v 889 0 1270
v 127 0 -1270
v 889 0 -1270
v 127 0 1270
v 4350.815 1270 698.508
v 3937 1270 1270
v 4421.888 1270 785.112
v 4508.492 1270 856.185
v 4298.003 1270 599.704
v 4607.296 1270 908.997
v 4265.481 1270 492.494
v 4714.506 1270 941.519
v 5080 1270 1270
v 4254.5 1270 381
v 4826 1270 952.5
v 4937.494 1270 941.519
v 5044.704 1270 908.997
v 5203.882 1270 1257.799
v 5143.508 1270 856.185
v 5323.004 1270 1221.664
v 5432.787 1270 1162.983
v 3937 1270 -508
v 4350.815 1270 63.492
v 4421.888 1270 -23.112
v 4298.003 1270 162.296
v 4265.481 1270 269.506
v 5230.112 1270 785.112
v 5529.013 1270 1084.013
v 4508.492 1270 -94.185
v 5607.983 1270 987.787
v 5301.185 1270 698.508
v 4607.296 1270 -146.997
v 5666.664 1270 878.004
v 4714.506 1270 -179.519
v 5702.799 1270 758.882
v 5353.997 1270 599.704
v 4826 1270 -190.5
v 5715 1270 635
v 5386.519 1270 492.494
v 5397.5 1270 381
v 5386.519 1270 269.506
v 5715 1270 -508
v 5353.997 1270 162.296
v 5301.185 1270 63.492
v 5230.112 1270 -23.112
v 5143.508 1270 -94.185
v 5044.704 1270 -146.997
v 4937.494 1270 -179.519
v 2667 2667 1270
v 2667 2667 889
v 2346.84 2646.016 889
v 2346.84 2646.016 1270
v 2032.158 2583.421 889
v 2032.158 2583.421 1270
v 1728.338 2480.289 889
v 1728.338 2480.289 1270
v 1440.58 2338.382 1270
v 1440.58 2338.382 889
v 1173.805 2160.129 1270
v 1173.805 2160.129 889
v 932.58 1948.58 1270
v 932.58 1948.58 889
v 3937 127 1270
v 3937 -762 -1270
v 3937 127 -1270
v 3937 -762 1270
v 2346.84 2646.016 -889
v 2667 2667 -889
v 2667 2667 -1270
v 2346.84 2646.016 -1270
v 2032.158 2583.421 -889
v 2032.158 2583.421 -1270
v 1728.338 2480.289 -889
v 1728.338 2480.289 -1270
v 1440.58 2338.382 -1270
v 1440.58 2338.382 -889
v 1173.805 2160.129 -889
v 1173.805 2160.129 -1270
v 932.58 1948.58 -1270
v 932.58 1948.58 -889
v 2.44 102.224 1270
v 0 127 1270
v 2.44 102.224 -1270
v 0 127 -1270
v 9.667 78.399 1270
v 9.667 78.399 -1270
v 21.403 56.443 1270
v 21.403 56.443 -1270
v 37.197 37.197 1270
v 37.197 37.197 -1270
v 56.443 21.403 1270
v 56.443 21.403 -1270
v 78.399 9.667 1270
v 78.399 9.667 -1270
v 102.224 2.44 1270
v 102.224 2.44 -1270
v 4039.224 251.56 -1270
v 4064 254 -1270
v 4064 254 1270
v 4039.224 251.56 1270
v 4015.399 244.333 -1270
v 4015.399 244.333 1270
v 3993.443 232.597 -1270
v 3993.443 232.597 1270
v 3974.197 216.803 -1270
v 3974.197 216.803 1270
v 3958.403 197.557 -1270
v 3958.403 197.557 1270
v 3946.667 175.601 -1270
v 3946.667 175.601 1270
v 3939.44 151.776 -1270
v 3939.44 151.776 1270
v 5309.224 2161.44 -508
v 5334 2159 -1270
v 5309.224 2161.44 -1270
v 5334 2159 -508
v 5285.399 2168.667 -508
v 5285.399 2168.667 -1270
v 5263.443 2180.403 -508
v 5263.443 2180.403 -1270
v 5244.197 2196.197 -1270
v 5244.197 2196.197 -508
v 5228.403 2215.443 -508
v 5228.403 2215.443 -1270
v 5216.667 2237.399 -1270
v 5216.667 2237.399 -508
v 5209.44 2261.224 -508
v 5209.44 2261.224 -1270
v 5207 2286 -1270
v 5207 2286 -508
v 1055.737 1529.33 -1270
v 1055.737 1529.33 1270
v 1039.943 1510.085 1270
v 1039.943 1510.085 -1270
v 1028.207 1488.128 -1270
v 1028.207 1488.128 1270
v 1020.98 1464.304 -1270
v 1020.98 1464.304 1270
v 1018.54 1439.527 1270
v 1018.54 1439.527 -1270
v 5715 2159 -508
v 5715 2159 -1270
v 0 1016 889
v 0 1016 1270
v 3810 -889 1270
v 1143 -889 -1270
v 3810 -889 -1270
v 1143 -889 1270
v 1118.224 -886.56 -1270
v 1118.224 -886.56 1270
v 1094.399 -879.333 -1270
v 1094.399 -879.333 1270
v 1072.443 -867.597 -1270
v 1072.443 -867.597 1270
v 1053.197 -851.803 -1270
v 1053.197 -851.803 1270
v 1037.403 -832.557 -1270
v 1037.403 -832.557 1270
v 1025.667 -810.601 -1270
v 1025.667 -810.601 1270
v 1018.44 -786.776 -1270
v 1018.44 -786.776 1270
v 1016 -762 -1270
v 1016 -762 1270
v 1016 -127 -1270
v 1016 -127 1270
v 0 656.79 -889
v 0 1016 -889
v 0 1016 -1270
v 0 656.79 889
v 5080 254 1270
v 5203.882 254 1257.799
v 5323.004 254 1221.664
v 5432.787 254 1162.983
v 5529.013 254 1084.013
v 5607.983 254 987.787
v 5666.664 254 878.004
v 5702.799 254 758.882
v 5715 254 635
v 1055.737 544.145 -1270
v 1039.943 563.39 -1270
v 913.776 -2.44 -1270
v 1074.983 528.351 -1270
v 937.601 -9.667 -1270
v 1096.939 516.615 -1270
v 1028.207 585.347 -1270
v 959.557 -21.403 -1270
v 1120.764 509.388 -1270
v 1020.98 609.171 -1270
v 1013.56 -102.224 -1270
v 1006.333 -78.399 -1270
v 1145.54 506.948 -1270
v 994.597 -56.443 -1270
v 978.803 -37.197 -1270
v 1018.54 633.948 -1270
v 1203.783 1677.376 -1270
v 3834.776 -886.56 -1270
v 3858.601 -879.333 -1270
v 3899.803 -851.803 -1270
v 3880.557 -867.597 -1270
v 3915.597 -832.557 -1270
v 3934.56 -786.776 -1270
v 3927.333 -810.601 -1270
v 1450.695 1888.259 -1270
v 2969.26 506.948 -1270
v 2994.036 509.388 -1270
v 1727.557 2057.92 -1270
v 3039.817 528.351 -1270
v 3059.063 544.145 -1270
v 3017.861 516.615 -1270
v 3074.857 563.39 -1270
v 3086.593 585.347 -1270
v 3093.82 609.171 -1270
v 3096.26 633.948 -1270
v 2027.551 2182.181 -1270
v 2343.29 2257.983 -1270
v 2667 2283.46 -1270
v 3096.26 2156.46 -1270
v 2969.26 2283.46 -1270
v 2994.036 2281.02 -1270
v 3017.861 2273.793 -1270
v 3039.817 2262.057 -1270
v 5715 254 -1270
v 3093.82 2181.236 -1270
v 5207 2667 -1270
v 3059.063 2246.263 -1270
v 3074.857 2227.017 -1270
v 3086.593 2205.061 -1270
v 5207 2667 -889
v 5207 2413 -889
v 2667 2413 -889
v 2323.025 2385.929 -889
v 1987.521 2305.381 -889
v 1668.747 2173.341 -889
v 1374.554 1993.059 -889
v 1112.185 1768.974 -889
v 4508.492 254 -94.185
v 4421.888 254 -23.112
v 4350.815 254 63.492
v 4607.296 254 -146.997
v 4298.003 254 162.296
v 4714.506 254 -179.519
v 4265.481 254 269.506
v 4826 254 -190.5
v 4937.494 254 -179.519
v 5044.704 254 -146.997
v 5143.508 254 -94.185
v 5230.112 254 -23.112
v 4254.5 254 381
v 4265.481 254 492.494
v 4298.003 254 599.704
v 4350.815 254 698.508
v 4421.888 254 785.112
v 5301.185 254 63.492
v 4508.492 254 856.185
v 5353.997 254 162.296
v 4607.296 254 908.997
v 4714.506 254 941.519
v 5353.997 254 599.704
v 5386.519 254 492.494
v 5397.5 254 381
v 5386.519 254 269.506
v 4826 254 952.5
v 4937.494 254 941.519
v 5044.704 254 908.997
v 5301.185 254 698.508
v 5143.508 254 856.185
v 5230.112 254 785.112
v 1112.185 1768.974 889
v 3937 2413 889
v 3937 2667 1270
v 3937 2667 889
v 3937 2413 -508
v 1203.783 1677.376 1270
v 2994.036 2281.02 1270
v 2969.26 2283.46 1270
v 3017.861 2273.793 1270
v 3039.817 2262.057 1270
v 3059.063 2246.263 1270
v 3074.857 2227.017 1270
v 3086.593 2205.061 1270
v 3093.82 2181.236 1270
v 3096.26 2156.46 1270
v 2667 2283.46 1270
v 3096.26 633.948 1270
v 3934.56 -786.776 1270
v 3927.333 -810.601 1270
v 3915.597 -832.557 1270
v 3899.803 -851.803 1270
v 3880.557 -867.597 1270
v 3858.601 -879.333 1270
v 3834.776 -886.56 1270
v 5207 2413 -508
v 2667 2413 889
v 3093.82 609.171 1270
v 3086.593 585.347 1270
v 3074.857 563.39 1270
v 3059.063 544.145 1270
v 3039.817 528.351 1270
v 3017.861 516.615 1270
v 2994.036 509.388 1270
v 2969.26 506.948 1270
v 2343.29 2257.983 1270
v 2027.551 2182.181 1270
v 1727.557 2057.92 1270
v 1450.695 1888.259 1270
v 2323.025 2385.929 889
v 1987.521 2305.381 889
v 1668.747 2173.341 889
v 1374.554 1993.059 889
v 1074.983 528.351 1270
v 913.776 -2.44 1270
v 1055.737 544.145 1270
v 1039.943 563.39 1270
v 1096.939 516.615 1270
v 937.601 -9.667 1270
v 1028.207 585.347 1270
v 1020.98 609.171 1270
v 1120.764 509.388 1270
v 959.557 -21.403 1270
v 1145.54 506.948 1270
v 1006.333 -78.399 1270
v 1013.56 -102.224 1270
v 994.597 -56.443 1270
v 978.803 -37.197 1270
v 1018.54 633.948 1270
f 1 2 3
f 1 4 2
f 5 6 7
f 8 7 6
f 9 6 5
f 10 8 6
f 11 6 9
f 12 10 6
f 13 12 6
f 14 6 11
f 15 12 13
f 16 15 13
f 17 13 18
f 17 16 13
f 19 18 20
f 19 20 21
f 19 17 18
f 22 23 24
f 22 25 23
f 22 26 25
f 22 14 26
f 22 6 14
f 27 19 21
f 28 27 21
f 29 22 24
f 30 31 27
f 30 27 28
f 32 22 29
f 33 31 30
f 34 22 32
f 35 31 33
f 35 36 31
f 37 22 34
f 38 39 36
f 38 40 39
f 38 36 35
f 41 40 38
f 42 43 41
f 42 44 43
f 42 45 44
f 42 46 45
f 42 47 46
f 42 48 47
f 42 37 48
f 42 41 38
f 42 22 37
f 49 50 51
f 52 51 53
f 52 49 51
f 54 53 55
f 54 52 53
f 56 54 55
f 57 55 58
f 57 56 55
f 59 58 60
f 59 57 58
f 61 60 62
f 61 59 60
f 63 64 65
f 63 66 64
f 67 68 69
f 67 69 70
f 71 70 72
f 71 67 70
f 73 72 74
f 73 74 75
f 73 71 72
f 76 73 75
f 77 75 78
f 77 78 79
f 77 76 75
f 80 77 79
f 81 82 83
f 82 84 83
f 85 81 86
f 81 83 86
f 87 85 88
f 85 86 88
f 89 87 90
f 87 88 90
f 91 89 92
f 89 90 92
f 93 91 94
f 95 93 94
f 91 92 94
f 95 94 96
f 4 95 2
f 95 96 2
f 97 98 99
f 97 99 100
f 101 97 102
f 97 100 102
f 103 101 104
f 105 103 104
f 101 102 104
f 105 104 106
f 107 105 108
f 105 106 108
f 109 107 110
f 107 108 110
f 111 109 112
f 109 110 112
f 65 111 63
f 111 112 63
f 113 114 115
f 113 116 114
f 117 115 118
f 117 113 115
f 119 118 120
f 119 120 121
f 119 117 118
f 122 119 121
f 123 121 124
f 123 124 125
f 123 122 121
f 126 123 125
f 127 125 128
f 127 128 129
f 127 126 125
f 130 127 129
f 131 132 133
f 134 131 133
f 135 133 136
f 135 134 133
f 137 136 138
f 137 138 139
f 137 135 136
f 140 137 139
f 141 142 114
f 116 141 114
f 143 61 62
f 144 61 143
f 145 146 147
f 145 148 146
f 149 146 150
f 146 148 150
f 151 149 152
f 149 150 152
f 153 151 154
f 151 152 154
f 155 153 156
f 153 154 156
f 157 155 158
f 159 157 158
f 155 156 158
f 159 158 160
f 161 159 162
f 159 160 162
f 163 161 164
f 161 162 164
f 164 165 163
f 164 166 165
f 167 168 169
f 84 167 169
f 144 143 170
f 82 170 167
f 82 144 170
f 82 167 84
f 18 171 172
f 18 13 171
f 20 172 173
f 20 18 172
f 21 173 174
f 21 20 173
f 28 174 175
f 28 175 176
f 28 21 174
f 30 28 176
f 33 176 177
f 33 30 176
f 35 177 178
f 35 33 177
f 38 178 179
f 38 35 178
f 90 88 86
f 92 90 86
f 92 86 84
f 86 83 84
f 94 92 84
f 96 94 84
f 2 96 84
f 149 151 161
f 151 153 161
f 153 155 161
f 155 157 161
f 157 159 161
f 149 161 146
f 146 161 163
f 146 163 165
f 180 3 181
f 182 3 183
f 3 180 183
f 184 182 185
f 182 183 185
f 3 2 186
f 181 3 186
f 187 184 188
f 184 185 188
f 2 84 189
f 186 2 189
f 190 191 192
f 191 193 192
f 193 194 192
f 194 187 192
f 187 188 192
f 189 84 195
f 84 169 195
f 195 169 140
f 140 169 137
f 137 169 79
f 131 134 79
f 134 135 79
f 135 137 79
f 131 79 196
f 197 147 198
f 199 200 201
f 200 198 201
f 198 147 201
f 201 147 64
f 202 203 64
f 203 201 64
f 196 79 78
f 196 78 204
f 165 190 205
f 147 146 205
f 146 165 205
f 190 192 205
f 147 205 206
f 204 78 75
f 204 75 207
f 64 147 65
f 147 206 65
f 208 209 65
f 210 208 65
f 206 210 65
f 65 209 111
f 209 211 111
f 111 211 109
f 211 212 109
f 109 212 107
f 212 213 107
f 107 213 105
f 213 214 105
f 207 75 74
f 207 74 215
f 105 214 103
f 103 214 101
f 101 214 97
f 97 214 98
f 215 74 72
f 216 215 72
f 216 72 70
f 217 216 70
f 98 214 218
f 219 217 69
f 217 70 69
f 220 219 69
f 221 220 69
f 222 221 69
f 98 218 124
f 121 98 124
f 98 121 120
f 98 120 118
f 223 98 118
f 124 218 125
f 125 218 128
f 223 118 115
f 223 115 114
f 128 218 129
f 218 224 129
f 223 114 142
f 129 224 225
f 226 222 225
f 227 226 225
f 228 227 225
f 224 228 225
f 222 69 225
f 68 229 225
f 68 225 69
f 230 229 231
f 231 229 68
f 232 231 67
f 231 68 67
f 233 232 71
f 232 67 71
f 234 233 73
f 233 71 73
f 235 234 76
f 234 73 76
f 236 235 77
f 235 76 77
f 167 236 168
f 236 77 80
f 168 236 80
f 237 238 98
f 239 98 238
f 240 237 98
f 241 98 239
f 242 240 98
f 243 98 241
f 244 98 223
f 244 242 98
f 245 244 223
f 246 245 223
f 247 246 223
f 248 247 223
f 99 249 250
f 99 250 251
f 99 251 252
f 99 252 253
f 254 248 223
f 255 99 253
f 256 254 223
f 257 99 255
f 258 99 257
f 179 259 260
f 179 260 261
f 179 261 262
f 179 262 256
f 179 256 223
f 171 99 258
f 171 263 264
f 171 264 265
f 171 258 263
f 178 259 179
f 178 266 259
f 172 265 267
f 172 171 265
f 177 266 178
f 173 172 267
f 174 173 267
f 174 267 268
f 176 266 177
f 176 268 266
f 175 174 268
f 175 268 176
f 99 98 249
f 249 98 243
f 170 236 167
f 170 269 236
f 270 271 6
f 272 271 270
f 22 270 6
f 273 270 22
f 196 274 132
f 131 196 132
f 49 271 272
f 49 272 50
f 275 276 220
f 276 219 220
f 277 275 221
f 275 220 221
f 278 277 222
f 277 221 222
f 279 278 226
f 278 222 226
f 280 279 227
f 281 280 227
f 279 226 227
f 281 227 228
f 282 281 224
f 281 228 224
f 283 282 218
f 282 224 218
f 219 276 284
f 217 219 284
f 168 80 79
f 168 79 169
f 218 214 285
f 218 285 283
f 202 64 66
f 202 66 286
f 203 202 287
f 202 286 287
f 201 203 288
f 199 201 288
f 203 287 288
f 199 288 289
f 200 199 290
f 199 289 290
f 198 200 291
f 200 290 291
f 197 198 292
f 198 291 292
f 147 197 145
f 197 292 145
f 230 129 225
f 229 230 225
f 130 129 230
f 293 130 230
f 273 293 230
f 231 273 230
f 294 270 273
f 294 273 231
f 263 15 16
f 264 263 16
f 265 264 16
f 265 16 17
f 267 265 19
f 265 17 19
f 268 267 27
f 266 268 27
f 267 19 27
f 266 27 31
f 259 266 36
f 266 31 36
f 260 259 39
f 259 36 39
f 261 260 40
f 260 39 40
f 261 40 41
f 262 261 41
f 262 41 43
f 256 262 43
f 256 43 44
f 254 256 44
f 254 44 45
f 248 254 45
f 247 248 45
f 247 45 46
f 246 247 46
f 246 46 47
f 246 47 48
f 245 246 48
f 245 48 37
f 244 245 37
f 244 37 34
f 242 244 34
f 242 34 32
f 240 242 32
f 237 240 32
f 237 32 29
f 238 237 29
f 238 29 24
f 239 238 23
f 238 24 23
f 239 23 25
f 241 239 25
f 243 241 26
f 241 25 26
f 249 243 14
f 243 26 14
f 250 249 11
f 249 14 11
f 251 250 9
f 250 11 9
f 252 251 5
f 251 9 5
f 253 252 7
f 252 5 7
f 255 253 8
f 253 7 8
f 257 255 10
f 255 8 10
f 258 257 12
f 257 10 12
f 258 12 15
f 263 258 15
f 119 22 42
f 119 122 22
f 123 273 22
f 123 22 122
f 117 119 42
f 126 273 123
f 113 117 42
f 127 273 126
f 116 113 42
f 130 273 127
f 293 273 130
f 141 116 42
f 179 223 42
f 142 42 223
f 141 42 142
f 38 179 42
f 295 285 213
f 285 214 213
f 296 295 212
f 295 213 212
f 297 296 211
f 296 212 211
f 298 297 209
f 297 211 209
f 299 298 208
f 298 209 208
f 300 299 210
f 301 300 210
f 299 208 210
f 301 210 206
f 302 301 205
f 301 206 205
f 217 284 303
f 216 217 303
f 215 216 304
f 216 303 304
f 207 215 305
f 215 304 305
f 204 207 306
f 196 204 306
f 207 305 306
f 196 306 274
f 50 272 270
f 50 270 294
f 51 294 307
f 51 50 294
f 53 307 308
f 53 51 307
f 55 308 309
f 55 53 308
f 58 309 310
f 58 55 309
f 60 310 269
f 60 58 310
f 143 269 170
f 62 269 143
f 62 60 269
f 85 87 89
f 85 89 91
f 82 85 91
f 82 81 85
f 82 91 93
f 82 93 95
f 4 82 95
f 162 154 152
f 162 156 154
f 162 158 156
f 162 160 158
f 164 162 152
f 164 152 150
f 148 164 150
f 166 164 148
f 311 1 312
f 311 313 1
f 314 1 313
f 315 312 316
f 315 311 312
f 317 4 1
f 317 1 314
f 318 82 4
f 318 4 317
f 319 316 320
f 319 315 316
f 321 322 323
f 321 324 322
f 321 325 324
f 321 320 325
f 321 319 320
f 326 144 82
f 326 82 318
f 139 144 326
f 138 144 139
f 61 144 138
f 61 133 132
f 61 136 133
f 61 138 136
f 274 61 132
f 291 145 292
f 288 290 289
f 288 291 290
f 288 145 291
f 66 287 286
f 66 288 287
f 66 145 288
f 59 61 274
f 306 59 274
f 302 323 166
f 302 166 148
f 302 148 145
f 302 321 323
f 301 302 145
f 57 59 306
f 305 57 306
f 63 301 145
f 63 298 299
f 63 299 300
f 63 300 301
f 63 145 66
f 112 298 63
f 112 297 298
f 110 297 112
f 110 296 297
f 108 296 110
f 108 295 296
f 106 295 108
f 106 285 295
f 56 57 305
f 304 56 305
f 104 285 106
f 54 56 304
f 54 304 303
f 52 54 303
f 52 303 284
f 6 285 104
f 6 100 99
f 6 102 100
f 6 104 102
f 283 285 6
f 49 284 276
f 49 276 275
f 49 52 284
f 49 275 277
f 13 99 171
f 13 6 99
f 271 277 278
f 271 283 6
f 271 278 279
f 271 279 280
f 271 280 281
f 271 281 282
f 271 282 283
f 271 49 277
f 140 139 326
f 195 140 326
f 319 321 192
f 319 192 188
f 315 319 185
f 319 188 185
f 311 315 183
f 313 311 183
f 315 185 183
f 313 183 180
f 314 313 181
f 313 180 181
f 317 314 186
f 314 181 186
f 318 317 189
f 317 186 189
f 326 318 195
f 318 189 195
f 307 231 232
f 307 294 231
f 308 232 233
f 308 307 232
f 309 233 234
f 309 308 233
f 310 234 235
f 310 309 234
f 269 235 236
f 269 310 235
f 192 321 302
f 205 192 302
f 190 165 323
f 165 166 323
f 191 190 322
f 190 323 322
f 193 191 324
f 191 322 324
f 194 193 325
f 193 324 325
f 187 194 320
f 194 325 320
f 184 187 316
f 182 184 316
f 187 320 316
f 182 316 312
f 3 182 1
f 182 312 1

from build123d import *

# Parameters (mm, degrees)
BOSS_EXTRUDE1_DEPTH = 1270
CUT_EXTRUDE2_DEPTH  = 6799.949477677
CUT_EXTRUDE3_DEPTH  = 889
SKETCH5_W           = 1778
SKETCH5_H           = 1778
CUT_EXTRUDE4_DEPTH  = 1397
SKETCH6_R           = 571.5
CUT_EXTRUDE5_DEPTH  = 6240.824196241
FILLET1_R           = 635
FILLET2_R           = 127
FILLET3_R           = 127


with BuildPart() as part:
    # Sketch1 → Boss-Extrude1 (new, symmetric)
    with BuildSketch(Plane.XY):
        with BuildLine():
            Line((0, 0), (1016, 0))
            Line((1016, 0), (1016, -889))
            Line((1016, -889), (3937, -889))
            Line((3937, -889), (3937, 254))
            Line((3937, 254), (5715, 254))
            Line((5715, 254), (5715, 2159))
            Line((5715, 2159), (5207, 2159))
            Line((5207, 2159), (5207, 2667))
            Line((5207, 2667), (2667, 2667))
            ThreePointArc((2667, 2667), (1728.338394969, 2480.288597975), (932.579510314, 1948.579510314))
            Line((932.579510314, 1948.579510314), (0, 1016))
            Line((0, 1016), (0, 0))
        make_face()
    extrude(amount=BOSS_EXTRUDE1_DEPTH, both=True)

    # Sketch3 → Cut-Extrude2 (cut, through all)
    with BuildSketch(Plane.XY.offset(1270)):
        with BuildLine():
            Line((3096.26, 2283.46), (2667, 2283.46))
            ThreePointArc((2667, 2283.46), (1875.112798618, 2125.943842075), (1203.783245171, 1677.375775458))
            Line((1203.783245171, 1677.375775458), (1018.54, 1492.132530287))
            Line((1018.54, 1492.132530287), (1018.54, 506.947897552))
            Line((1018.54, 506.947897552), (3096.26, 506.947897552))
            Line((3096.26, 506.947897552), (3096.26, 2283.46))
        make_face()
    extrude(amount=-CUT_EXTRUDE2_DEPTH, mode=Mode.SUBTRACT)

    # Sketch4 → Cut-Extrude3 (cut, symmetric)
    with BuildSketch(Plane.XY):
        with BuildLine():
            Line((5207, 2413), (2667, 2413))
            ThreePointArc((2667, 2413), (1825.539986789, 2245.623196717), (1112.184632736, 1768.974387893))
            Line((1112.184632736, 1768.974387893), (0, 656.789755157))
            Line((0, 656.789755157), (0, 1016))
            Line((0, 1016), (932.579510314, 1948.579510314))
            ThreePointArc((932.579510314, 1948.579510314), (1728.338394969, 2480.288597975), (2667, 2667))
            Line((2667, 2667), (5207, 2667))
            Line((5207, 2667), (5207, 2413))
        make_face()
    extrude(amount=CUT_EXTRUDE3_DEPTH, both=True, mode=Mode.SUBTRACT)

    # Sketch5 → Cut-Extrude4 (cut)
    with BuildSketch(Plane(origin=(0, 2667, 0), x_dir=(1, 0, 0), z_dir=(0, 1, 0))):
        with Locations((4826, -381)):
            Rectangle(SKETCH5_W, SKETCH5_H)
    extrude(amount=-CUT_EXTRUDE4_DEPTH, mode=Mode.SUBTRACT)

    # Sketch6 → Cut-Extrude5 (cut, through all)
    with BuildSketch(Plane(origin=(0, 1270, 0), x_dir=(1, 0, 0), z_dir=(0, 1, 0))):
        with Locations(Location((4826, -381, 0), (0, 0, 270))):
            Circle(SKETCH6_R)
    extrude(amount=-CUT_EXTRUDE5_DEPTH, mode=Mode.SUBTRACT)

    # Fillet1
    fillet1_edges = [part.edges().sort_by_distance(p)[0] for p in [
        (5715, 762, 1270),
    ]]
    fillet(fillet1_edges, radius=FILLET1_R)

    # Fillet2
    fillet2_edges = [part.edges().sort_by_distance(p)[0] for p in [
        (3937, 254, 0),
        (3937, -889, 0),
        (1016, -889, 0),
        (1016, 0, 0),
        (0, 0, 0),
        (5207, 2159, -889),
    ]]
    fillet(fillet2_edges, radius=FILLET2_R)

    # Fillet3
    fillet3_edges = [part.edges().sort_by_distance(p)[0] for p in [
        (3096.26, 2283.46, 0),
        (3096.26, 506.947897552, 0),
        (1018.54, 506.947897552, 0),
        (1018.54, 1492.132530287, 0),
    ]]
    fillet(fillet3_edges, radius=FILLET3_R)


solid = part.part
